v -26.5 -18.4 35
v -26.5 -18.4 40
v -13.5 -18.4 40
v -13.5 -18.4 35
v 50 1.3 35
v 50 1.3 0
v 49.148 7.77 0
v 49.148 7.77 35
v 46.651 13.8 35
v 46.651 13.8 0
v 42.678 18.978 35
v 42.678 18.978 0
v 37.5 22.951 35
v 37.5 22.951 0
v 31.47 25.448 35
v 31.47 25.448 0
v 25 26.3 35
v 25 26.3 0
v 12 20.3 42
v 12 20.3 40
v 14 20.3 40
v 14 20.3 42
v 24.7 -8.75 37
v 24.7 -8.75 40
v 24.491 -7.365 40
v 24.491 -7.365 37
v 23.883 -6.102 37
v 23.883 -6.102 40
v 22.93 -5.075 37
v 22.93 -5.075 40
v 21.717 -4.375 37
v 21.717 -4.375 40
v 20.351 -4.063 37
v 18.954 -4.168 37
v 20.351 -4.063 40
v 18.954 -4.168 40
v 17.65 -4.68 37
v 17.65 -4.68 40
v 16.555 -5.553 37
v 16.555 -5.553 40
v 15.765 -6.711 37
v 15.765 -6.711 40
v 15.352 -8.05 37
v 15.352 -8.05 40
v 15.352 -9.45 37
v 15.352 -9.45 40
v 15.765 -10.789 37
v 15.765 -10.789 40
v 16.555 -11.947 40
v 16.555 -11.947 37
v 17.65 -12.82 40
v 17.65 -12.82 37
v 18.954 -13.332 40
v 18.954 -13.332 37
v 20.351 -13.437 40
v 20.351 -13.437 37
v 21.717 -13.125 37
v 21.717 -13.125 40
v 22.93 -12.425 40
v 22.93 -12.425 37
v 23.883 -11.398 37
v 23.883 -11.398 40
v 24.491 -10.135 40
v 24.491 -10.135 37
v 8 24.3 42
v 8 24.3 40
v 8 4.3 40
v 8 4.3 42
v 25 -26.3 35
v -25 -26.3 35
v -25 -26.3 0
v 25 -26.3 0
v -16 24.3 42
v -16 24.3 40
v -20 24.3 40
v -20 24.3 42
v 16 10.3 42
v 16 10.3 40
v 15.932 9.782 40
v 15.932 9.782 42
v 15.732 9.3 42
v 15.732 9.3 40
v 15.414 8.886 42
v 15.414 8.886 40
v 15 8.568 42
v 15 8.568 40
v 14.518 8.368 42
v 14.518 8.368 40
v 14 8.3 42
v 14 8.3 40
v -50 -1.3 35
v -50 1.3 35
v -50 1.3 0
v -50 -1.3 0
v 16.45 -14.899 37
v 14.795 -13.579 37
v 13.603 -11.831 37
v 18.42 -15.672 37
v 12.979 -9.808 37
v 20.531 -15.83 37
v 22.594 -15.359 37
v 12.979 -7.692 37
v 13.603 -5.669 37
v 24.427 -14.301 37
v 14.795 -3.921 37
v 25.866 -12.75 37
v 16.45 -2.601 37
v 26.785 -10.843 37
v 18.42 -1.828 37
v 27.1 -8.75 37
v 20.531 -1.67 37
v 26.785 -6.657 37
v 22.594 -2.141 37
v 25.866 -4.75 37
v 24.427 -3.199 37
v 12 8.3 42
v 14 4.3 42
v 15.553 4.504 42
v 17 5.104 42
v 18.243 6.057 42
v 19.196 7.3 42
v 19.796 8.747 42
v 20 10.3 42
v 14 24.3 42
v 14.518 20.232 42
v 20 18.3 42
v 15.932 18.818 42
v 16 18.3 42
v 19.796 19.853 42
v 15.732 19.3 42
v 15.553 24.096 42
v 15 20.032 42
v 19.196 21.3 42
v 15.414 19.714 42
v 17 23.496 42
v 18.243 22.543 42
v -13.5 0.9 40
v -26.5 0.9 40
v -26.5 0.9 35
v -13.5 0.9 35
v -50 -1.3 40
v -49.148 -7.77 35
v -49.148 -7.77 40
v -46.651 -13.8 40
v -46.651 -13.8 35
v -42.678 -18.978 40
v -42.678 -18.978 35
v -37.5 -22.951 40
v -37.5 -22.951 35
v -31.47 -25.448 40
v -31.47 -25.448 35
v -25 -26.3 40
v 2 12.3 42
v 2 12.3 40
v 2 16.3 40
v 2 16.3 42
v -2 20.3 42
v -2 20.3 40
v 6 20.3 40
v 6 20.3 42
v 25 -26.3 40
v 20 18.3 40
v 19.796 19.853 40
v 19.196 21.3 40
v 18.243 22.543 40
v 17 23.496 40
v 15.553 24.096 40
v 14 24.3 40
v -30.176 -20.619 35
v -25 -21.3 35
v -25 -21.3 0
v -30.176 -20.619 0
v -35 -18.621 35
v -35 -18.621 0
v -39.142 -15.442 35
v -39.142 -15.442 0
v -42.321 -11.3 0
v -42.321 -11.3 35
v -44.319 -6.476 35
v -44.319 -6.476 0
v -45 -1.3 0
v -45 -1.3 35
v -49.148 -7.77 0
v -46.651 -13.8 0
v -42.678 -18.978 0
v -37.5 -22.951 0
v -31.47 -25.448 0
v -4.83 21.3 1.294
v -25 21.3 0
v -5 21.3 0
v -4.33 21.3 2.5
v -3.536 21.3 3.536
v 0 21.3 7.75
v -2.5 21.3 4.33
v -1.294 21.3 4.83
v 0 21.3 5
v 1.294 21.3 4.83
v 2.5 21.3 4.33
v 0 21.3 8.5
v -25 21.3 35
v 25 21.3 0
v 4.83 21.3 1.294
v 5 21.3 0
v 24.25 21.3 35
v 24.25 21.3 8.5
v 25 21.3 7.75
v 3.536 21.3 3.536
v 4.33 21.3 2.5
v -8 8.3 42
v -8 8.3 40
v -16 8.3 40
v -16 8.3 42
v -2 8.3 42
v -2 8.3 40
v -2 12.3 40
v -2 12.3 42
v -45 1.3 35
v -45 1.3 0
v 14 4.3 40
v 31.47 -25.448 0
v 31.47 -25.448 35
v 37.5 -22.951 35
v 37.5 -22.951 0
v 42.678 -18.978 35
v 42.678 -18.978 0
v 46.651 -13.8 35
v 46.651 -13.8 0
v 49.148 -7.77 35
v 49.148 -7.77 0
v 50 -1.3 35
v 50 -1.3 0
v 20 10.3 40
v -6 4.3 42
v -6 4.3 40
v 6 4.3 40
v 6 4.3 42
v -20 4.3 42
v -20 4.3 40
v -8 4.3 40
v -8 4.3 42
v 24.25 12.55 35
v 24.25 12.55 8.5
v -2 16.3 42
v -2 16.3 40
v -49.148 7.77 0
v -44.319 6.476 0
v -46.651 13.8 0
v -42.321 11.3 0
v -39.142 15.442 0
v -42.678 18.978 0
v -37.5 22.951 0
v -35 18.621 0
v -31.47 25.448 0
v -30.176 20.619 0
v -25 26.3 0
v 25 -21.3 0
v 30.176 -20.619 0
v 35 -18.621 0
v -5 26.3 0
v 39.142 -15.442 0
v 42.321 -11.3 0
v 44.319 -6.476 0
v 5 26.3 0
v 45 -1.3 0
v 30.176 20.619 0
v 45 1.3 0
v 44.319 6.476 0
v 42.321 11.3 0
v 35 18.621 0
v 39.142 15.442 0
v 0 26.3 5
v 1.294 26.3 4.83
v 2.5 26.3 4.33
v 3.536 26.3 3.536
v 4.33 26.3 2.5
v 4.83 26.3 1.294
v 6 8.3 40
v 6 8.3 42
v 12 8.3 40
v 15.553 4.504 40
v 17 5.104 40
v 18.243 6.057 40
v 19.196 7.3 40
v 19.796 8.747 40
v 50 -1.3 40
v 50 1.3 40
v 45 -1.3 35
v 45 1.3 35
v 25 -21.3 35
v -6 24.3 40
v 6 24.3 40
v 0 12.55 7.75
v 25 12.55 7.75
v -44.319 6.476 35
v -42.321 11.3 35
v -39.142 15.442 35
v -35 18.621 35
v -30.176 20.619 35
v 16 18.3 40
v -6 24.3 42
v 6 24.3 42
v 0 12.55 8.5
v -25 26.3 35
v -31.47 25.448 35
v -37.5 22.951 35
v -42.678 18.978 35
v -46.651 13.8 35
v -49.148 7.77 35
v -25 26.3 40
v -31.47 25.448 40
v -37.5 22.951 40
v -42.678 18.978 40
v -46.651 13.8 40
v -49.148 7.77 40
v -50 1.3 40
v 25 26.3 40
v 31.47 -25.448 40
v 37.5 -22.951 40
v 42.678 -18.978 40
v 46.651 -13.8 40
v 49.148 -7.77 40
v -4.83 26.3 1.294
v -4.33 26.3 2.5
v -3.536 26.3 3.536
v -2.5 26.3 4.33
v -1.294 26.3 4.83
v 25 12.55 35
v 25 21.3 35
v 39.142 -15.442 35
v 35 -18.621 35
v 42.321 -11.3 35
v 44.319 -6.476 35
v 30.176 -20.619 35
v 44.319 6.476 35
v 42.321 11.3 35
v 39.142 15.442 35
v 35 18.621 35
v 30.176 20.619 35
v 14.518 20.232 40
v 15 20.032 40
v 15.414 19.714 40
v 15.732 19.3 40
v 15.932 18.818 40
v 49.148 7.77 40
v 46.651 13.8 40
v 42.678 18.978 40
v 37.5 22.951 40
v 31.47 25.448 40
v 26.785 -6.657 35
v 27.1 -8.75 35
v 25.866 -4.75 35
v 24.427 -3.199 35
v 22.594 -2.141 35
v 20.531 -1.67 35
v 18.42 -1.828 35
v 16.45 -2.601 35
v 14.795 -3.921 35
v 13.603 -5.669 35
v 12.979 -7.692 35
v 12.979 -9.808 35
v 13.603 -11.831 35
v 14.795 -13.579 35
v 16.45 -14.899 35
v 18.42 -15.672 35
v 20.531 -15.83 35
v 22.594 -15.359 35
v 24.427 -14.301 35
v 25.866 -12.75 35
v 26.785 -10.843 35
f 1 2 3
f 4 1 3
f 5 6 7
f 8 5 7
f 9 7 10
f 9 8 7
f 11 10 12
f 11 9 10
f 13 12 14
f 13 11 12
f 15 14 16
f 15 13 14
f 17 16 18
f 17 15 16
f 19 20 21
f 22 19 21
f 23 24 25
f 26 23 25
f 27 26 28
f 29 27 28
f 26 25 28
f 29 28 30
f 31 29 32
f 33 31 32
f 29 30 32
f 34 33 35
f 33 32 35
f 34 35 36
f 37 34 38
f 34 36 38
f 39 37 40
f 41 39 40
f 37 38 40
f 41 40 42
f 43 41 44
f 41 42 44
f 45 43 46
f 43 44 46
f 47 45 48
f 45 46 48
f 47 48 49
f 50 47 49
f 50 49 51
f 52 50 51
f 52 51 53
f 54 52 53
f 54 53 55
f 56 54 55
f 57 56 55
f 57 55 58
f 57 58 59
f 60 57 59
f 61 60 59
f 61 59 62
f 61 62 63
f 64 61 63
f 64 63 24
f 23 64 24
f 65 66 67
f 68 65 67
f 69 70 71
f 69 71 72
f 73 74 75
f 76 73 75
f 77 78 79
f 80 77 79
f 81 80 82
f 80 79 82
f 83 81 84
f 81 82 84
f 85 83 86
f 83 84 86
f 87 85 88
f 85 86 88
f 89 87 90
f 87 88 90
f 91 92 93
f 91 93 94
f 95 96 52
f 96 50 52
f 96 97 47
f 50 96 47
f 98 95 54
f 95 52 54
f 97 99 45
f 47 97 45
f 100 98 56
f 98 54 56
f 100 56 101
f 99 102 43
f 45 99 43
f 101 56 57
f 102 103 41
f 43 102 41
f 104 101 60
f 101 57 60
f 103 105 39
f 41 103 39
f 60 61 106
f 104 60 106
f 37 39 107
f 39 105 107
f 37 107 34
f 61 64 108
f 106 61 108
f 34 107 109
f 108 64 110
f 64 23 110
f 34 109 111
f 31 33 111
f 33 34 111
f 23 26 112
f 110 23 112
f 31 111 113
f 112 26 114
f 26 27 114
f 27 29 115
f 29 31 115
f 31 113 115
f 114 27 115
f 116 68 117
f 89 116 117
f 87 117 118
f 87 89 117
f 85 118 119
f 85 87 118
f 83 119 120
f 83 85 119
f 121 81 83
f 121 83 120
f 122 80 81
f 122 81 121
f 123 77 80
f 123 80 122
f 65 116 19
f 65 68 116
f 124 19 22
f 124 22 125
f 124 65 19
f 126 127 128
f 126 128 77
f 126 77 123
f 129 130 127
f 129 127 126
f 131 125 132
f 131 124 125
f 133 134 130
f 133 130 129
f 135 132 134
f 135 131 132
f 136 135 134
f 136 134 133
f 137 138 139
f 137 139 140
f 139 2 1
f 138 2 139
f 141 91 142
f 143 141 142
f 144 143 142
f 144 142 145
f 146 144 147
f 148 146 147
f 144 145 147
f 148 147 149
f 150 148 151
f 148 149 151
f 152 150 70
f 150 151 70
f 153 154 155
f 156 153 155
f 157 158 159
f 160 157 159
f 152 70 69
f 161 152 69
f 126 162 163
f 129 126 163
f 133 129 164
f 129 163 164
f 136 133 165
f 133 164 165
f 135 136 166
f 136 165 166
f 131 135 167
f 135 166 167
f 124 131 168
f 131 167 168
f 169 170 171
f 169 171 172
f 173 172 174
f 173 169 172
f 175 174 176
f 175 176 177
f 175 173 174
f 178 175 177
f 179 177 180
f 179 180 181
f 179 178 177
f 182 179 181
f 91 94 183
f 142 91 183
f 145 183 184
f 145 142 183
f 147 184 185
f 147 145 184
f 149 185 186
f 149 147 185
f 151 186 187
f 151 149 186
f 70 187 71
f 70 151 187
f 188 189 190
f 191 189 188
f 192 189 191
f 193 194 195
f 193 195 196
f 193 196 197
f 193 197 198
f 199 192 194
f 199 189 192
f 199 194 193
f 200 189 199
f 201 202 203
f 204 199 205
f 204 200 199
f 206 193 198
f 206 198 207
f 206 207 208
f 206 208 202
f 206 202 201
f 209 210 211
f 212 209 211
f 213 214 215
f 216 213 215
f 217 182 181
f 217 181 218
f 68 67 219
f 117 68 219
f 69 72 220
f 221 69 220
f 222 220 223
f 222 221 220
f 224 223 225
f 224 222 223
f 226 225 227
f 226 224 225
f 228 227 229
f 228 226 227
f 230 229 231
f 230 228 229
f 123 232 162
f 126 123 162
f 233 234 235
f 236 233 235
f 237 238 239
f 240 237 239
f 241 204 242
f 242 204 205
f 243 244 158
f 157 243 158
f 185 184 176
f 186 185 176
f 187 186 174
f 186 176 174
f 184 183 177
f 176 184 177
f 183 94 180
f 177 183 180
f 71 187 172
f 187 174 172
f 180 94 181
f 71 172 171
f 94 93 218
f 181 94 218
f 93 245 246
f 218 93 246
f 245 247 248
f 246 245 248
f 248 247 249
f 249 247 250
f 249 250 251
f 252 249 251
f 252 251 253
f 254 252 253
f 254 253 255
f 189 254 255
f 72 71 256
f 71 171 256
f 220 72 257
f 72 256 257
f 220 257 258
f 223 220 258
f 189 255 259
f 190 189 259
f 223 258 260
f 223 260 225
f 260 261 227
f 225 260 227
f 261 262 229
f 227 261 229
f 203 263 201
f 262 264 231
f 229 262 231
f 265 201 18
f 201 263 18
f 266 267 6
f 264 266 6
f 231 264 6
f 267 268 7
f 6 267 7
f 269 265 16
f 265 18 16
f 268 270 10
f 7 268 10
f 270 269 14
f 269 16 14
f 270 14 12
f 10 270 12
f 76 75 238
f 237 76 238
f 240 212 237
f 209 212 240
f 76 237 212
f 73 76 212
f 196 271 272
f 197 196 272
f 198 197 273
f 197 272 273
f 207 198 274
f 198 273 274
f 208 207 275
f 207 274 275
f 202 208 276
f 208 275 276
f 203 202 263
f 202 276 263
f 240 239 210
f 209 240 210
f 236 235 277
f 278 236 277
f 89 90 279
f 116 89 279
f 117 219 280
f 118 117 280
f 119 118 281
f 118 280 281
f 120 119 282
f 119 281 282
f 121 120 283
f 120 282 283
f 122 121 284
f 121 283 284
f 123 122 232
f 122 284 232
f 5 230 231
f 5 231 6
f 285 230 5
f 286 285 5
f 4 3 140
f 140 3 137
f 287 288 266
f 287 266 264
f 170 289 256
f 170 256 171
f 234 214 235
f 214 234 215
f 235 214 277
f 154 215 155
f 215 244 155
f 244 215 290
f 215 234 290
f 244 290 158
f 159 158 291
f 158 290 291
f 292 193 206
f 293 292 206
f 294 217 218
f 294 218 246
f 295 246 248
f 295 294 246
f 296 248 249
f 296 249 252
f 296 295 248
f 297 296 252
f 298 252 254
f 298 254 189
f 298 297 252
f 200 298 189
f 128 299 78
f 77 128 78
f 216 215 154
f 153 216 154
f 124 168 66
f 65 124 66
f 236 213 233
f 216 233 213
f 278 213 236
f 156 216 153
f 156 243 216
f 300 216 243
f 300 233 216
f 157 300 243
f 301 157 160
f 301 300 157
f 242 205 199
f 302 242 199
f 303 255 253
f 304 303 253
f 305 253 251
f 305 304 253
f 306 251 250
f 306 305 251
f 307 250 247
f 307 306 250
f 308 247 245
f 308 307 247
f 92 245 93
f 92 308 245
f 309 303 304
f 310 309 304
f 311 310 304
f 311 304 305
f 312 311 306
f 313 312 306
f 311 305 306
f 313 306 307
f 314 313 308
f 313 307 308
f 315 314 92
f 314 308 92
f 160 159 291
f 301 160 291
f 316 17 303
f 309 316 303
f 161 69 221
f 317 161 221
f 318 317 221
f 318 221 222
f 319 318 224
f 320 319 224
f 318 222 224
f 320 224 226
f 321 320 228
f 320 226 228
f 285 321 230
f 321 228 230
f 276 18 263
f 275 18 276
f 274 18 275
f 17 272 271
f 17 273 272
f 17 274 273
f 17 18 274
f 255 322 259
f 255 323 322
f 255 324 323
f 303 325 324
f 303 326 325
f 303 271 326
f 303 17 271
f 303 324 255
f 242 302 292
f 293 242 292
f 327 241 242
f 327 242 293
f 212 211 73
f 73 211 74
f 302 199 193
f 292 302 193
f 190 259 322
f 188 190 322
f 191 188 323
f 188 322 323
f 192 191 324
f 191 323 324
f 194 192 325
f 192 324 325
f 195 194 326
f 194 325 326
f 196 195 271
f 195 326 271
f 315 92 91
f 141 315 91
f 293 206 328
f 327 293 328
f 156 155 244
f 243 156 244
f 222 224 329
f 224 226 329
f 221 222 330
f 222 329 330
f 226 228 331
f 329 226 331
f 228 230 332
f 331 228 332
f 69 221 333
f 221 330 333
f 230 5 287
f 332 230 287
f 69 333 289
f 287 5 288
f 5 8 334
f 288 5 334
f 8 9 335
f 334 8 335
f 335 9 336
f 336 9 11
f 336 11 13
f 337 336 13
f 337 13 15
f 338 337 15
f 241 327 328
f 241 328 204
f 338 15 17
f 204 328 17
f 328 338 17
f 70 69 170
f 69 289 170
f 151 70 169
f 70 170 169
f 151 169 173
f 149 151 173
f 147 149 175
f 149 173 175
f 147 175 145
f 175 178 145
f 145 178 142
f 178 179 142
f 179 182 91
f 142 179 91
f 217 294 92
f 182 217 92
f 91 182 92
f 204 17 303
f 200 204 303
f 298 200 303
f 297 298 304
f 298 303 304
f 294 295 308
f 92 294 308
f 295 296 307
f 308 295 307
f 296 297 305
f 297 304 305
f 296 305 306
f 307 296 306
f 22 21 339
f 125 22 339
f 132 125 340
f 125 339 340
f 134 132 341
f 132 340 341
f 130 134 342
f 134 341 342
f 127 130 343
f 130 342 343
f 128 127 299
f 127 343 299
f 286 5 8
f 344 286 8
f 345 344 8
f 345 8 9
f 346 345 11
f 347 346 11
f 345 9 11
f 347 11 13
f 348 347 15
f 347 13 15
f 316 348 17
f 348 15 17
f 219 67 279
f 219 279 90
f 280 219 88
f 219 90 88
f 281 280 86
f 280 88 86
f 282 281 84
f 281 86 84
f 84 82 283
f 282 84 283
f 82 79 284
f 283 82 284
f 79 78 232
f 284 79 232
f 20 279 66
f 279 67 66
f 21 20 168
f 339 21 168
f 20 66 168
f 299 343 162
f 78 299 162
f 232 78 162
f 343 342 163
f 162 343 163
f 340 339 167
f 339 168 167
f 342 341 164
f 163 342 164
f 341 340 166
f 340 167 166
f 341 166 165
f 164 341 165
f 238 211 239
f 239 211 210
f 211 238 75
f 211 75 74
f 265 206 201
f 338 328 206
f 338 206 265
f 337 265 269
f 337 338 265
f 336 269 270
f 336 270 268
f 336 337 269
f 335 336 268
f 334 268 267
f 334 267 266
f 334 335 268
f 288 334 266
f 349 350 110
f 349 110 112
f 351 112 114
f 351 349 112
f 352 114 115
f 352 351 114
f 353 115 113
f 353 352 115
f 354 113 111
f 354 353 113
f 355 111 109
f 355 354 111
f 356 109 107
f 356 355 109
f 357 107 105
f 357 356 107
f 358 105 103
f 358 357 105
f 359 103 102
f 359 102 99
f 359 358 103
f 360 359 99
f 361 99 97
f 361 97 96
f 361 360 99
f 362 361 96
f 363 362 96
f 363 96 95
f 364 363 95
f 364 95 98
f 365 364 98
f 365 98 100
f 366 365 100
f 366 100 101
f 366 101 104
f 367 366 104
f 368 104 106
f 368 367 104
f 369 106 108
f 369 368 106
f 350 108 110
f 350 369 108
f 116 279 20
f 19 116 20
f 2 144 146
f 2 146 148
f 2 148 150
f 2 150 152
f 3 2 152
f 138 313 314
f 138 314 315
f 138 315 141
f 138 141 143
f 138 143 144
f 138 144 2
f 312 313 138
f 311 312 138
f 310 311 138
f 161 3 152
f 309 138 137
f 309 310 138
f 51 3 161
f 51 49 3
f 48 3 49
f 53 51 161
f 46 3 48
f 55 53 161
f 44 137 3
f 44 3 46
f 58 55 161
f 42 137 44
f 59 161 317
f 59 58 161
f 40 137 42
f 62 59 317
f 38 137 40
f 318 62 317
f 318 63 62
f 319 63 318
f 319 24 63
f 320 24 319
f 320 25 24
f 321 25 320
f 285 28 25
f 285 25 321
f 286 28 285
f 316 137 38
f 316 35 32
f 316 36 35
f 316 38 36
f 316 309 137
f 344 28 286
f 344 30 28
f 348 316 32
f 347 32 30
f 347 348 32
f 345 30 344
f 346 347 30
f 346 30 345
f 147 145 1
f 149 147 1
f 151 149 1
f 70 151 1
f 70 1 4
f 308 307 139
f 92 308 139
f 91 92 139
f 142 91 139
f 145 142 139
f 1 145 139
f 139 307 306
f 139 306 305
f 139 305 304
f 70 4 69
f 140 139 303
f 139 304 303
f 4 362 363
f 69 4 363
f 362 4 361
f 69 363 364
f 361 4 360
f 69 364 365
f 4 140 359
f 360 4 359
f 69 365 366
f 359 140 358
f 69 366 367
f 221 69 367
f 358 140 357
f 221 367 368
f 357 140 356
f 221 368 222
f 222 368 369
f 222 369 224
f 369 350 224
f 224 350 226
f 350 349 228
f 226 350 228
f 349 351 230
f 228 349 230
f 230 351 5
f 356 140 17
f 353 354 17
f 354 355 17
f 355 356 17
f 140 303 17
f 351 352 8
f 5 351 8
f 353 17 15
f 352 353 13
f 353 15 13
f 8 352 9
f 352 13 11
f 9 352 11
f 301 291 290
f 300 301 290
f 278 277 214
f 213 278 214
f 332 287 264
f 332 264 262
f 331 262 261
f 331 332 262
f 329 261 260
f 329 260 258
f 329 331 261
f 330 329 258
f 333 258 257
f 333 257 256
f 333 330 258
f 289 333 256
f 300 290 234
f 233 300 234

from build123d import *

# Parameters (mm, degrees)
F2_DEPTH  = 5
F3_W      = 13
F3_H      = 19.3
F3_R      = 4.7
F4_DEPTH  = 5
F5_R      = 7.1
F6_DEPTH  = 2
F8_DEPTH  = 35
F10_DEPTH = 5
F12_DEPTH = 8.75
F14_DEPTH = 2


with BuildPart() as f2:
    # F1 (on offset) → F2 (new body)
    with BuildSketch(Plane.XY.offset(35)):
        with BuildLine():
            ThreePointArc((50, 1.3), (42.6776695297, 18.9776695297), (25, 26.3))
            Line((25, 26.3), (-25, 26.3))
            ThreePointArc((-25, 26.3), (-42.6776695297, 18.9776695297), (-50, 1.3))
            Line((-50, 1.3), (-50, -1.3))
            ThreePointArc((-50, -1.3), (-42.6776695297, -18.9776695297), (-25, -26.3))
            Line((-25, -26.3), (25, -26.3))
            ThreePointArc((25, -26.3), (42.6776695297, -18.9776695297), (50, -1.3))
            Line((50, -1.3), (50, 1.3))
        make_face()
    extrude(amount=F2_DEPTH)

    # F3 (on face) → F4 (cut, through all)
    with BuildSketch(Plane.XY.offset(40)):
        with Locations((-20, -8.75)):
            Rectangle(F3_W, F3_H)
        with Locations((20, -8.75)):
            Circle(F3_R)
    extrude(amount=-F4_DEPTH, mode=Mode.SUBTRACT)

    # F5 (on face) → F6 (cut)
    with BuildSketch(Plane.XY.offset(35)):
        with Locations((20, -8.75)):
            Circle(F5_R)
    extrude(amount=F6_DEPTH, mode=Mode.SUBTRACT)


with BuildPart() as f8:
    # F7 (on face) → F8 (new body)
    with BuildSketch(Plane.XY.offset(35)):
        with BuildLine():
            ThreePointArc((50, 1.3), (42.6776695297, 18.9776695297), (25, 26.3))
            Line((25, 26.3), (-25, 26.3))
            ThreePointArc((-25, 26.3), (-42.6776695297, 18.9776695297), (-50, 1.3))
            Line((-50, 1.3), (-50, -1.3))
            ThreePointArc((-50, -1.3), (-42.6776695297, -18.9776695297), (-25, -26.3))
            Line((-25, -26.3), (25, -26.3))
            ThreePointArc((25, -26.3), (42.6776695297, -18.9776695297), (50, -1.3))
            Line((50, -1.3), (50, 1.3))
        make_face()
        with BuildLine():
            Line((-25, 21.3), (25, 21.3))
            ThreePointArc((25, 21.3), (39.1421356237, 15.4421356237), (45, 1.3))
            Line((45, 1.3), (45, -1.3))
            ThreePointArc((45, -1.3), (39.1421356237, -15.4421356237), (25, -21.3))
            Line((25, -21.3), (-25, -21.3))
            ThreePointArc((-25, -21.3), (-39.1421356237, -15.4421356237), (-45, -1.3))
            Line((-45, -1.3), (-45, 1.3))
            ThreePointArc((-45, 1.3), (-39.1421356237, 15.4421356237), (-25, 21.3))
        make_face(mode=Mode.SUBTRACT)
    extrude(amount=-F8_DEPTH)

    # F9 (on face) → F10 (cut, through all)
    with BuildSketch(Plane(origin=(0, 26.3, 0), x_dir=(-1, 0, 0), z_dir=(0, 1, 0))):
        with BuildLine():
            ThreePointArc((0, 5), (-3.5355339059, 3.5355339059), (-5, 0))
            Line((-5, 0), (5, 0))
            ThreePointArc((5, 0), (3.5355339059, 3.5355339059), (0, 5))
        make_face()
    extrude(amount=-F10_DEPTH, mode=Mode.SUBTRACT)

    # F11 (on face) → F12 (join)
    with BuildSketch(Plane.XZ.offset(-21.3)):
        Polygon((25, 35), (24.25, 35), (24.25, 8.5), (0, 8.5), (0, 7.75), (25, 7.75), align=None)
    extrude(amount=F12_DEPTH)


with BuildPart() as f14:
    # F3 (on face) → F14 (new body)
    with BuildSketch(Plane.XY.offset(40)):
        Polygon((-16, 24.3), (-20, 24.3), (-20, 4.3), (-8, 4.3), (-8, 8.3), (-16, 8.3), align=None)
    extrude(amount=F14_DEPTH)


with BuildPart() as f14b:
    # F3 (on face) → F14, piece 2 (new body)
    with BuildSketch(Plane.XY.offset(40)):
        Polygon((6, 24.3), (-6, 24.3), (-6, 4.3), (6, 4.3), (6, 8.3), (-2, 8.3), (-2, 12.3), (2, 12.3), (2, 16.3), (-2, 16.3), (-2, 20.3), (6, 20.3), align=None)
    extrude(amount=F14_DEPTH)


with BuildPart() as f14c:
    # F3 (on face) → F14, piece 3 (new body)
    with BuildSketch(Plane.XY.offset(40)):
        with BuildLine():
            Line((12, 24.3), (8, 24.3))
            Line((8, 24.3), (8, 4.3))
            Line((8, 4.3), (12, 4.3))
            Line((12, 4.3), (14, 4.3))
            ThreePointArc((14, 4.3), (18.2426406871, 6.0573593129), (20, 10.3))
            Line((20, 10.3), (20, 18.3))
            ThreePointArc((20, 18.3), (18.2426406871, 22.5426406871), (14, 24.3))
            Line((14, 24.3), (12, 24.3))
        make_face()
        with BuildLine():
            Line((12, 8.3), (12, 20.3))
            Line((12, 20.3), (14, 20.3))
            ThreePointArc((14, 20.3), (15.4142135624, 19.7142135624), (16, 18.3))
            Line((16, 18.3), (16, 10.3))
            ThreePointArc((16, 10.3), (15.4142135624, 8.8857864376), (14, 8.3))
            Line((14, 8.3), (12, 8.3))
        make_face(mode=Mode.SUBTRACT)
    extrude(amount=F14_DEPTH)


solid = Compound([f2.part, f8.part, f14.part, f14b.part, f14c.part])
